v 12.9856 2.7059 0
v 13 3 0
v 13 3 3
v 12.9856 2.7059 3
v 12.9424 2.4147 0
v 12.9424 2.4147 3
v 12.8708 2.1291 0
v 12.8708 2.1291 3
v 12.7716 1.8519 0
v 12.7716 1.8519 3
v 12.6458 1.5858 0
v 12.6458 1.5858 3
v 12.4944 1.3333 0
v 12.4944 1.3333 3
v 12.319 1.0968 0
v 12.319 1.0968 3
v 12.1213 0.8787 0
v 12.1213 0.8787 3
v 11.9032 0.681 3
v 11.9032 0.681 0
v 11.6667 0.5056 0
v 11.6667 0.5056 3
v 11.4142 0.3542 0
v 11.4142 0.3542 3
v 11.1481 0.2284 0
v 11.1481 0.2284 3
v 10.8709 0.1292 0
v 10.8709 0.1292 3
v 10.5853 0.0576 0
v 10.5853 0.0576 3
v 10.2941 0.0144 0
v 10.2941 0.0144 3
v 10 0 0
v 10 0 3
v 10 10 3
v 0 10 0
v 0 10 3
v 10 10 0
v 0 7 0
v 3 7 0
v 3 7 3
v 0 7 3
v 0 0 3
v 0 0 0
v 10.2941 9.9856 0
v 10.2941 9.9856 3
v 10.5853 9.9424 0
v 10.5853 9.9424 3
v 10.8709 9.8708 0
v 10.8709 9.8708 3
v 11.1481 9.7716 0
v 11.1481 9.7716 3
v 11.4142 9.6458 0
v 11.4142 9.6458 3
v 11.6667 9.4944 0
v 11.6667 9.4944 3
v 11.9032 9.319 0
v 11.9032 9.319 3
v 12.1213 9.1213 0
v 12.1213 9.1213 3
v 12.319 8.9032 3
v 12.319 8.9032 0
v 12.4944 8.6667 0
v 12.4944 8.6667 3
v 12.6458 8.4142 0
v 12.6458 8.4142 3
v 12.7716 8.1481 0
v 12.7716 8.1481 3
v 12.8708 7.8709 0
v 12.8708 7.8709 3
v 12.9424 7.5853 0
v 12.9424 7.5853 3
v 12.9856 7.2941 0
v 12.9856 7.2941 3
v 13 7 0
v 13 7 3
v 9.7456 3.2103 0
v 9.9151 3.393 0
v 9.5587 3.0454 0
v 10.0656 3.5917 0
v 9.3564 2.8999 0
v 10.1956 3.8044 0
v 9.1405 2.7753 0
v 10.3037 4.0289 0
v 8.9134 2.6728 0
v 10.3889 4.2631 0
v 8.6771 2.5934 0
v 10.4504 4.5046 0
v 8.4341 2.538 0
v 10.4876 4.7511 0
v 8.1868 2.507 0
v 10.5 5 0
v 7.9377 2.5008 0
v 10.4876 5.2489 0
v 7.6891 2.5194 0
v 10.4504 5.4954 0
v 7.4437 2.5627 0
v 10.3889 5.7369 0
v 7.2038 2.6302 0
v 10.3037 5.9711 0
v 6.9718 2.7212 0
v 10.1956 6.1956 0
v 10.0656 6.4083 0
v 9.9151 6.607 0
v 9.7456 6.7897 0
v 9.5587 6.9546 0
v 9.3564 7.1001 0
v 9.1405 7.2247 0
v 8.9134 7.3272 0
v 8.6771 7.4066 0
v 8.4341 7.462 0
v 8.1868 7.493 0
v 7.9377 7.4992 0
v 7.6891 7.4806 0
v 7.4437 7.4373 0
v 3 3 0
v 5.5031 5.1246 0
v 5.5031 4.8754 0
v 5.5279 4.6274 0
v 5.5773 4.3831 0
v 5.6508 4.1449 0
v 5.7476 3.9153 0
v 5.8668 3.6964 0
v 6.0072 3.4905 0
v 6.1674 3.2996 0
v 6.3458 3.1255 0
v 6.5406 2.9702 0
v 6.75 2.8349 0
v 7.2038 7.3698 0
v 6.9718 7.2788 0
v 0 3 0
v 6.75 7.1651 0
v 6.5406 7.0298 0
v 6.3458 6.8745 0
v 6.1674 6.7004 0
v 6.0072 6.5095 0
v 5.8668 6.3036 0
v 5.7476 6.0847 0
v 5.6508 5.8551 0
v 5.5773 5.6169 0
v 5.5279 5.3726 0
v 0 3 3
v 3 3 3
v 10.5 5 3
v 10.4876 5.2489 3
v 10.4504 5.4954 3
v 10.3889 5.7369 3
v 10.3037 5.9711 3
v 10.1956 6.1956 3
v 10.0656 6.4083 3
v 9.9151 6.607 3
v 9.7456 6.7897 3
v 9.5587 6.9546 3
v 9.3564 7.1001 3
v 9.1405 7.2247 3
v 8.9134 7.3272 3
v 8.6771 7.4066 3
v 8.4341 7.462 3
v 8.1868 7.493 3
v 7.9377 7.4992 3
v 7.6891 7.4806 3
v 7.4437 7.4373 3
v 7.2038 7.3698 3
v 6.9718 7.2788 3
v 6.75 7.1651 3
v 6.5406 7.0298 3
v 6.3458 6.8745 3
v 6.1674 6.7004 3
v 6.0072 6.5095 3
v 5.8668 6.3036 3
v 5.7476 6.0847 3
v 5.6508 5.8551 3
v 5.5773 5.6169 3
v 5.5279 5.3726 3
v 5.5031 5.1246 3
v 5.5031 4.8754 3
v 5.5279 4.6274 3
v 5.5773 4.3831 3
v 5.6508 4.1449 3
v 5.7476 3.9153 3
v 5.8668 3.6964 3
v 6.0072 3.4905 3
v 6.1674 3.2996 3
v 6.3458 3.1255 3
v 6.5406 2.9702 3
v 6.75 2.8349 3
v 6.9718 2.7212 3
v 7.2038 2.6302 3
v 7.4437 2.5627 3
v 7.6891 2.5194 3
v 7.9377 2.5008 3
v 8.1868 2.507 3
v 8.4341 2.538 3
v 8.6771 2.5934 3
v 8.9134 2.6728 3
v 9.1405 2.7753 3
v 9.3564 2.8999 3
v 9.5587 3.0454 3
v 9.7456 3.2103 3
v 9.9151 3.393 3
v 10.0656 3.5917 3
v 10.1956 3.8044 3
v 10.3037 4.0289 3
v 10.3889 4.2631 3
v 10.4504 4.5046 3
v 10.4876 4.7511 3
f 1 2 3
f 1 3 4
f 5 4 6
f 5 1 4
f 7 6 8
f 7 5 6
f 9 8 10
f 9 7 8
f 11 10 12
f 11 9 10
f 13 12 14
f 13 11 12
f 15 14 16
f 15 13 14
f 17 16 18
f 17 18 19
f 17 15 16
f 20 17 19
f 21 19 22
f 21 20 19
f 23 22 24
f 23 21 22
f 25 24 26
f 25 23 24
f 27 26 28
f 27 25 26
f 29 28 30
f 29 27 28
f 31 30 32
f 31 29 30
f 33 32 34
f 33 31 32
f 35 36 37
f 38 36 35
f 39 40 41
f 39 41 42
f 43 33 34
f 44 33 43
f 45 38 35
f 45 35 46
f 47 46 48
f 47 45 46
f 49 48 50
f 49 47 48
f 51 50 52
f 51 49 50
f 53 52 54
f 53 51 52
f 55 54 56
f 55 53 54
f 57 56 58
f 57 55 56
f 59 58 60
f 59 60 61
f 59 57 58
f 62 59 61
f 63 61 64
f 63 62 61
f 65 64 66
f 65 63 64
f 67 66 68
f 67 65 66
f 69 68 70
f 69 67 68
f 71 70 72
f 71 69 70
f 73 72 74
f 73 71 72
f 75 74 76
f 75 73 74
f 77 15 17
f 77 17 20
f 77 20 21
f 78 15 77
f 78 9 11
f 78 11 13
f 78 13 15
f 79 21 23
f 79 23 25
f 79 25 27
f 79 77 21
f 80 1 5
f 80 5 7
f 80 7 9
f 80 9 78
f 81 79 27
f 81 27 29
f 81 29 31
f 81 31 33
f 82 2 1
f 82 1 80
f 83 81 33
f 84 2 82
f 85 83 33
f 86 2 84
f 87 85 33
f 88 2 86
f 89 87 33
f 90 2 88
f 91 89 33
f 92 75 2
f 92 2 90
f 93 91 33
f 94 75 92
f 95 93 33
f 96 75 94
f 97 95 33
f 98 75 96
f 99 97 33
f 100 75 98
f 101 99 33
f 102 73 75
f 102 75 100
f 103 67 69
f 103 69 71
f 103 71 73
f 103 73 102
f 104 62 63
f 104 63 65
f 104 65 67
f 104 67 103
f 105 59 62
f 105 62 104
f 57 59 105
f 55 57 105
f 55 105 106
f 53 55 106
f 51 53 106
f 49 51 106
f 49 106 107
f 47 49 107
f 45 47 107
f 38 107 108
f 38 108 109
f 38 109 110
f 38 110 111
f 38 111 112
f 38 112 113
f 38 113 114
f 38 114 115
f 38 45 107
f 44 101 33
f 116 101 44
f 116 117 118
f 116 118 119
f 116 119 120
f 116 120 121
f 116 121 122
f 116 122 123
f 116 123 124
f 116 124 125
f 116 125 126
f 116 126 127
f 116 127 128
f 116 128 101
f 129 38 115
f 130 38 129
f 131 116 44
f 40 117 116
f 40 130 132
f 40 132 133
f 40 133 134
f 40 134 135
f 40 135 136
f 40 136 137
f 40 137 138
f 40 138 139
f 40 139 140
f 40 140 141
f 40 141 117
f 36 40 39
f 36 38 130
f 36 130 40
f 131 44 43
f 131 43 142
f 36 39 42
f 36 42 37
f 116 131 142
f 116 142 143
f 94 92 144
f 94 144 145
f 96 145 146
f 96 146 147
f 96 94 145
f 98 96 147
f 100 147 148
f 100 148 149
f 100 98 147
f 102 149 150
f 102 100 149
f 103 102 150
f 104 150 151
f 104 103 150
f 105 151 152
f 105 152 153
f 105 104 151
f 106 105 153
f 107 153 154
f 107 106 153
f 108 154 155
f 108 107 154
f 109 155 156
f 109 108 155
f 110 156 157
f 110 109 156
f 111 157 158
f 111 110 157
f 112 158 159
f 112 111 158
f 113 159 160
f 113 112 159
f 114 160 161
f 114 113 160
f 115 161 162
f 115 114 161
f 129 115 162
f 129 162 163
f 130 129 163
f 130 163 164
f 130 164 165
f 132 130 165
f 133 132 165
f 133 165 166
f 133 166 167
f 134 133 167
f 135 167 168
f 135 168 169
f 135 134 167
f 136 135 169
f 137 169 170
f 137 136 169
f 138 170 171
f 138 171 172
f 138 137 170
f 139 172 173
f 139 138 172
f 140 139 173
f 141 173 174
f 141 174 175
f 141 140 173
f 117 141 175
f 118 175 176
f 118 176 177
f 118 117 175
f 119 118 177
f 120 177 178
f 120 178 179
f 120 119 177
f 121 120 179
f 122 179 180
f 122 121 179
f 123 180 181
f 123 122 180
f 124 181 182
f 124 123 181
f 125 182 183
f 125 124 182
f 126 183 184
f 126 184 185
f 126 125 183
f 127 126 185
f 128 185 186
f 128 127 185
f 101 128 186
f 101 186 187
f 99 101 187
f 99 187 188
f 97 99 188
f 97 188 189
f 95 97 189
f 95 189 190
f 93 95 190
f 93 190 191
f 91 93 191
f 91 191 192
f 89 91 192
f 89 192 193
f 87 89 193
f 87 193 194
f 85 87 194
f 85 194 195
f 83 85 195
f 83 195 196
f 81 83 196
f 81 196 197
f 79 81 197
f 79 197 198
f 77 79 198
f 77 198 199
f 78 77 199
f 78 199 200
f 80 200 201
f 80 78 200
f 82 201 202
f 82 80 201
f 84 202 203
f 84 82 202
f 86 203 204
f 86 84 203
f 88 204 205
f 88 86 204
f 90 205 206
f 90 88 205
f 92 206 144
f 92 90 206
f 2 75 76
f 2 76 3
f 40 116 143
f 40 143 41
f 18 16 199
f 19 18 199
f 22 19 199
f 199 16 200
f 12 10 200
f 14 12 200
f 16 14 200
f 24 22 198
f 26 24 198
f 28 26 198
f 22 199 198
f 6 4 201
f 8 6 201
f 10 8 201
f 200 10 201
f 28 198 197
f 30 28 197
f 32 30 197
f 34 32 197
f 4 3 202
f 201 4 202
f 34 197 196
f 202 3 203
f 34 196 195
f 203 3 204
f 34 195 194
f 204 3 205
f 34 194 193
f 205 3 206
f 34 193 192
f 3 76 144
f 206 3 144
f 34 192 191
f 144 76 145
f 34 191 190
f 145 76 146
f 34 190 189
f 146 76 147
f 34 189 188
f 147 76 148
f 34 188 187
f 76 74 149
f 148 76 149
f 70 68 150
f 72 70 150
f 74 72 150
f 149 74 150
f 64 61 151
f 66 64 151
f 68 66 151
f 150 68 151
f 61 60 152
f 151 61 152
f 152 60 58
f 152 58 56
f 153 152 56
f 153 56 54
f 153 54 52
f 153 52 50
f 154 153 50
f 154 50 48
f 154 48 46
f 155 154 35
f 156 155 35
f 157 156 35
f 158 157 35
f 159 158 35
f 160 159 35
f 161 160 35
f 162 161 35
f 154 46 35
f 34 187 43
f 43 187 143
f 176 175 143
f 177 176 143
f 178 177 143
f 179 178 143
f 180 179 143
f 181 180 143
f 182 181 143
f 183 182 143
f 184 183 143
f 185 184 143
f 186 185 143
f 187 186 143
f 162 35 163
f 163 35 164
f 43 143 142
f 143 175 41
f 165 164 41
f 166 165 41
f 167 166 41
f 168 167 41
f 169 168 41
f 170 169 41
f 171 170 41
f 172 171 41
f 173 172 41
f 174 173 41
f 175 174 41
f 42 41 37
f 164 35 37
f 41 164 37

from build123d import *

# Parameters (mm, degrees)
SKETCH1_R           = 2.5
BOSS_EXTRUDE1_DEPTH = 3


with BuildPart() as part:
    # Sketch1 → Boss-Extrude1 (new body)
    with BuildSketch(Plane.XY):
        with BuildLine():
            Line((0, 10), (10, 10))
            ThreePointArc((10, 10), (12.121320344, 9.121320344), (13, 7))
            Line((13, 7), (13, 3))
            ThreePointArc((13, 3), (12.121320344, 0.878679656), (10, 0))
            Line((10, 0), (0, 0))
            Line((0, 0), (0, 3))
            Line((0, 3), (3, 3))
            Line((3, 3), (3, 7))
            Line((3, 7), (0, 7))
            Line((0, 7), (0, 10))
        make_face()
        with Locations((8, 5)):
            Circle(SKETCH1_R, mode=Mode.SUBTRACT)
    extrude(amount=BOSS_EXTRUDE1_DEPTH)


solid = part.part
